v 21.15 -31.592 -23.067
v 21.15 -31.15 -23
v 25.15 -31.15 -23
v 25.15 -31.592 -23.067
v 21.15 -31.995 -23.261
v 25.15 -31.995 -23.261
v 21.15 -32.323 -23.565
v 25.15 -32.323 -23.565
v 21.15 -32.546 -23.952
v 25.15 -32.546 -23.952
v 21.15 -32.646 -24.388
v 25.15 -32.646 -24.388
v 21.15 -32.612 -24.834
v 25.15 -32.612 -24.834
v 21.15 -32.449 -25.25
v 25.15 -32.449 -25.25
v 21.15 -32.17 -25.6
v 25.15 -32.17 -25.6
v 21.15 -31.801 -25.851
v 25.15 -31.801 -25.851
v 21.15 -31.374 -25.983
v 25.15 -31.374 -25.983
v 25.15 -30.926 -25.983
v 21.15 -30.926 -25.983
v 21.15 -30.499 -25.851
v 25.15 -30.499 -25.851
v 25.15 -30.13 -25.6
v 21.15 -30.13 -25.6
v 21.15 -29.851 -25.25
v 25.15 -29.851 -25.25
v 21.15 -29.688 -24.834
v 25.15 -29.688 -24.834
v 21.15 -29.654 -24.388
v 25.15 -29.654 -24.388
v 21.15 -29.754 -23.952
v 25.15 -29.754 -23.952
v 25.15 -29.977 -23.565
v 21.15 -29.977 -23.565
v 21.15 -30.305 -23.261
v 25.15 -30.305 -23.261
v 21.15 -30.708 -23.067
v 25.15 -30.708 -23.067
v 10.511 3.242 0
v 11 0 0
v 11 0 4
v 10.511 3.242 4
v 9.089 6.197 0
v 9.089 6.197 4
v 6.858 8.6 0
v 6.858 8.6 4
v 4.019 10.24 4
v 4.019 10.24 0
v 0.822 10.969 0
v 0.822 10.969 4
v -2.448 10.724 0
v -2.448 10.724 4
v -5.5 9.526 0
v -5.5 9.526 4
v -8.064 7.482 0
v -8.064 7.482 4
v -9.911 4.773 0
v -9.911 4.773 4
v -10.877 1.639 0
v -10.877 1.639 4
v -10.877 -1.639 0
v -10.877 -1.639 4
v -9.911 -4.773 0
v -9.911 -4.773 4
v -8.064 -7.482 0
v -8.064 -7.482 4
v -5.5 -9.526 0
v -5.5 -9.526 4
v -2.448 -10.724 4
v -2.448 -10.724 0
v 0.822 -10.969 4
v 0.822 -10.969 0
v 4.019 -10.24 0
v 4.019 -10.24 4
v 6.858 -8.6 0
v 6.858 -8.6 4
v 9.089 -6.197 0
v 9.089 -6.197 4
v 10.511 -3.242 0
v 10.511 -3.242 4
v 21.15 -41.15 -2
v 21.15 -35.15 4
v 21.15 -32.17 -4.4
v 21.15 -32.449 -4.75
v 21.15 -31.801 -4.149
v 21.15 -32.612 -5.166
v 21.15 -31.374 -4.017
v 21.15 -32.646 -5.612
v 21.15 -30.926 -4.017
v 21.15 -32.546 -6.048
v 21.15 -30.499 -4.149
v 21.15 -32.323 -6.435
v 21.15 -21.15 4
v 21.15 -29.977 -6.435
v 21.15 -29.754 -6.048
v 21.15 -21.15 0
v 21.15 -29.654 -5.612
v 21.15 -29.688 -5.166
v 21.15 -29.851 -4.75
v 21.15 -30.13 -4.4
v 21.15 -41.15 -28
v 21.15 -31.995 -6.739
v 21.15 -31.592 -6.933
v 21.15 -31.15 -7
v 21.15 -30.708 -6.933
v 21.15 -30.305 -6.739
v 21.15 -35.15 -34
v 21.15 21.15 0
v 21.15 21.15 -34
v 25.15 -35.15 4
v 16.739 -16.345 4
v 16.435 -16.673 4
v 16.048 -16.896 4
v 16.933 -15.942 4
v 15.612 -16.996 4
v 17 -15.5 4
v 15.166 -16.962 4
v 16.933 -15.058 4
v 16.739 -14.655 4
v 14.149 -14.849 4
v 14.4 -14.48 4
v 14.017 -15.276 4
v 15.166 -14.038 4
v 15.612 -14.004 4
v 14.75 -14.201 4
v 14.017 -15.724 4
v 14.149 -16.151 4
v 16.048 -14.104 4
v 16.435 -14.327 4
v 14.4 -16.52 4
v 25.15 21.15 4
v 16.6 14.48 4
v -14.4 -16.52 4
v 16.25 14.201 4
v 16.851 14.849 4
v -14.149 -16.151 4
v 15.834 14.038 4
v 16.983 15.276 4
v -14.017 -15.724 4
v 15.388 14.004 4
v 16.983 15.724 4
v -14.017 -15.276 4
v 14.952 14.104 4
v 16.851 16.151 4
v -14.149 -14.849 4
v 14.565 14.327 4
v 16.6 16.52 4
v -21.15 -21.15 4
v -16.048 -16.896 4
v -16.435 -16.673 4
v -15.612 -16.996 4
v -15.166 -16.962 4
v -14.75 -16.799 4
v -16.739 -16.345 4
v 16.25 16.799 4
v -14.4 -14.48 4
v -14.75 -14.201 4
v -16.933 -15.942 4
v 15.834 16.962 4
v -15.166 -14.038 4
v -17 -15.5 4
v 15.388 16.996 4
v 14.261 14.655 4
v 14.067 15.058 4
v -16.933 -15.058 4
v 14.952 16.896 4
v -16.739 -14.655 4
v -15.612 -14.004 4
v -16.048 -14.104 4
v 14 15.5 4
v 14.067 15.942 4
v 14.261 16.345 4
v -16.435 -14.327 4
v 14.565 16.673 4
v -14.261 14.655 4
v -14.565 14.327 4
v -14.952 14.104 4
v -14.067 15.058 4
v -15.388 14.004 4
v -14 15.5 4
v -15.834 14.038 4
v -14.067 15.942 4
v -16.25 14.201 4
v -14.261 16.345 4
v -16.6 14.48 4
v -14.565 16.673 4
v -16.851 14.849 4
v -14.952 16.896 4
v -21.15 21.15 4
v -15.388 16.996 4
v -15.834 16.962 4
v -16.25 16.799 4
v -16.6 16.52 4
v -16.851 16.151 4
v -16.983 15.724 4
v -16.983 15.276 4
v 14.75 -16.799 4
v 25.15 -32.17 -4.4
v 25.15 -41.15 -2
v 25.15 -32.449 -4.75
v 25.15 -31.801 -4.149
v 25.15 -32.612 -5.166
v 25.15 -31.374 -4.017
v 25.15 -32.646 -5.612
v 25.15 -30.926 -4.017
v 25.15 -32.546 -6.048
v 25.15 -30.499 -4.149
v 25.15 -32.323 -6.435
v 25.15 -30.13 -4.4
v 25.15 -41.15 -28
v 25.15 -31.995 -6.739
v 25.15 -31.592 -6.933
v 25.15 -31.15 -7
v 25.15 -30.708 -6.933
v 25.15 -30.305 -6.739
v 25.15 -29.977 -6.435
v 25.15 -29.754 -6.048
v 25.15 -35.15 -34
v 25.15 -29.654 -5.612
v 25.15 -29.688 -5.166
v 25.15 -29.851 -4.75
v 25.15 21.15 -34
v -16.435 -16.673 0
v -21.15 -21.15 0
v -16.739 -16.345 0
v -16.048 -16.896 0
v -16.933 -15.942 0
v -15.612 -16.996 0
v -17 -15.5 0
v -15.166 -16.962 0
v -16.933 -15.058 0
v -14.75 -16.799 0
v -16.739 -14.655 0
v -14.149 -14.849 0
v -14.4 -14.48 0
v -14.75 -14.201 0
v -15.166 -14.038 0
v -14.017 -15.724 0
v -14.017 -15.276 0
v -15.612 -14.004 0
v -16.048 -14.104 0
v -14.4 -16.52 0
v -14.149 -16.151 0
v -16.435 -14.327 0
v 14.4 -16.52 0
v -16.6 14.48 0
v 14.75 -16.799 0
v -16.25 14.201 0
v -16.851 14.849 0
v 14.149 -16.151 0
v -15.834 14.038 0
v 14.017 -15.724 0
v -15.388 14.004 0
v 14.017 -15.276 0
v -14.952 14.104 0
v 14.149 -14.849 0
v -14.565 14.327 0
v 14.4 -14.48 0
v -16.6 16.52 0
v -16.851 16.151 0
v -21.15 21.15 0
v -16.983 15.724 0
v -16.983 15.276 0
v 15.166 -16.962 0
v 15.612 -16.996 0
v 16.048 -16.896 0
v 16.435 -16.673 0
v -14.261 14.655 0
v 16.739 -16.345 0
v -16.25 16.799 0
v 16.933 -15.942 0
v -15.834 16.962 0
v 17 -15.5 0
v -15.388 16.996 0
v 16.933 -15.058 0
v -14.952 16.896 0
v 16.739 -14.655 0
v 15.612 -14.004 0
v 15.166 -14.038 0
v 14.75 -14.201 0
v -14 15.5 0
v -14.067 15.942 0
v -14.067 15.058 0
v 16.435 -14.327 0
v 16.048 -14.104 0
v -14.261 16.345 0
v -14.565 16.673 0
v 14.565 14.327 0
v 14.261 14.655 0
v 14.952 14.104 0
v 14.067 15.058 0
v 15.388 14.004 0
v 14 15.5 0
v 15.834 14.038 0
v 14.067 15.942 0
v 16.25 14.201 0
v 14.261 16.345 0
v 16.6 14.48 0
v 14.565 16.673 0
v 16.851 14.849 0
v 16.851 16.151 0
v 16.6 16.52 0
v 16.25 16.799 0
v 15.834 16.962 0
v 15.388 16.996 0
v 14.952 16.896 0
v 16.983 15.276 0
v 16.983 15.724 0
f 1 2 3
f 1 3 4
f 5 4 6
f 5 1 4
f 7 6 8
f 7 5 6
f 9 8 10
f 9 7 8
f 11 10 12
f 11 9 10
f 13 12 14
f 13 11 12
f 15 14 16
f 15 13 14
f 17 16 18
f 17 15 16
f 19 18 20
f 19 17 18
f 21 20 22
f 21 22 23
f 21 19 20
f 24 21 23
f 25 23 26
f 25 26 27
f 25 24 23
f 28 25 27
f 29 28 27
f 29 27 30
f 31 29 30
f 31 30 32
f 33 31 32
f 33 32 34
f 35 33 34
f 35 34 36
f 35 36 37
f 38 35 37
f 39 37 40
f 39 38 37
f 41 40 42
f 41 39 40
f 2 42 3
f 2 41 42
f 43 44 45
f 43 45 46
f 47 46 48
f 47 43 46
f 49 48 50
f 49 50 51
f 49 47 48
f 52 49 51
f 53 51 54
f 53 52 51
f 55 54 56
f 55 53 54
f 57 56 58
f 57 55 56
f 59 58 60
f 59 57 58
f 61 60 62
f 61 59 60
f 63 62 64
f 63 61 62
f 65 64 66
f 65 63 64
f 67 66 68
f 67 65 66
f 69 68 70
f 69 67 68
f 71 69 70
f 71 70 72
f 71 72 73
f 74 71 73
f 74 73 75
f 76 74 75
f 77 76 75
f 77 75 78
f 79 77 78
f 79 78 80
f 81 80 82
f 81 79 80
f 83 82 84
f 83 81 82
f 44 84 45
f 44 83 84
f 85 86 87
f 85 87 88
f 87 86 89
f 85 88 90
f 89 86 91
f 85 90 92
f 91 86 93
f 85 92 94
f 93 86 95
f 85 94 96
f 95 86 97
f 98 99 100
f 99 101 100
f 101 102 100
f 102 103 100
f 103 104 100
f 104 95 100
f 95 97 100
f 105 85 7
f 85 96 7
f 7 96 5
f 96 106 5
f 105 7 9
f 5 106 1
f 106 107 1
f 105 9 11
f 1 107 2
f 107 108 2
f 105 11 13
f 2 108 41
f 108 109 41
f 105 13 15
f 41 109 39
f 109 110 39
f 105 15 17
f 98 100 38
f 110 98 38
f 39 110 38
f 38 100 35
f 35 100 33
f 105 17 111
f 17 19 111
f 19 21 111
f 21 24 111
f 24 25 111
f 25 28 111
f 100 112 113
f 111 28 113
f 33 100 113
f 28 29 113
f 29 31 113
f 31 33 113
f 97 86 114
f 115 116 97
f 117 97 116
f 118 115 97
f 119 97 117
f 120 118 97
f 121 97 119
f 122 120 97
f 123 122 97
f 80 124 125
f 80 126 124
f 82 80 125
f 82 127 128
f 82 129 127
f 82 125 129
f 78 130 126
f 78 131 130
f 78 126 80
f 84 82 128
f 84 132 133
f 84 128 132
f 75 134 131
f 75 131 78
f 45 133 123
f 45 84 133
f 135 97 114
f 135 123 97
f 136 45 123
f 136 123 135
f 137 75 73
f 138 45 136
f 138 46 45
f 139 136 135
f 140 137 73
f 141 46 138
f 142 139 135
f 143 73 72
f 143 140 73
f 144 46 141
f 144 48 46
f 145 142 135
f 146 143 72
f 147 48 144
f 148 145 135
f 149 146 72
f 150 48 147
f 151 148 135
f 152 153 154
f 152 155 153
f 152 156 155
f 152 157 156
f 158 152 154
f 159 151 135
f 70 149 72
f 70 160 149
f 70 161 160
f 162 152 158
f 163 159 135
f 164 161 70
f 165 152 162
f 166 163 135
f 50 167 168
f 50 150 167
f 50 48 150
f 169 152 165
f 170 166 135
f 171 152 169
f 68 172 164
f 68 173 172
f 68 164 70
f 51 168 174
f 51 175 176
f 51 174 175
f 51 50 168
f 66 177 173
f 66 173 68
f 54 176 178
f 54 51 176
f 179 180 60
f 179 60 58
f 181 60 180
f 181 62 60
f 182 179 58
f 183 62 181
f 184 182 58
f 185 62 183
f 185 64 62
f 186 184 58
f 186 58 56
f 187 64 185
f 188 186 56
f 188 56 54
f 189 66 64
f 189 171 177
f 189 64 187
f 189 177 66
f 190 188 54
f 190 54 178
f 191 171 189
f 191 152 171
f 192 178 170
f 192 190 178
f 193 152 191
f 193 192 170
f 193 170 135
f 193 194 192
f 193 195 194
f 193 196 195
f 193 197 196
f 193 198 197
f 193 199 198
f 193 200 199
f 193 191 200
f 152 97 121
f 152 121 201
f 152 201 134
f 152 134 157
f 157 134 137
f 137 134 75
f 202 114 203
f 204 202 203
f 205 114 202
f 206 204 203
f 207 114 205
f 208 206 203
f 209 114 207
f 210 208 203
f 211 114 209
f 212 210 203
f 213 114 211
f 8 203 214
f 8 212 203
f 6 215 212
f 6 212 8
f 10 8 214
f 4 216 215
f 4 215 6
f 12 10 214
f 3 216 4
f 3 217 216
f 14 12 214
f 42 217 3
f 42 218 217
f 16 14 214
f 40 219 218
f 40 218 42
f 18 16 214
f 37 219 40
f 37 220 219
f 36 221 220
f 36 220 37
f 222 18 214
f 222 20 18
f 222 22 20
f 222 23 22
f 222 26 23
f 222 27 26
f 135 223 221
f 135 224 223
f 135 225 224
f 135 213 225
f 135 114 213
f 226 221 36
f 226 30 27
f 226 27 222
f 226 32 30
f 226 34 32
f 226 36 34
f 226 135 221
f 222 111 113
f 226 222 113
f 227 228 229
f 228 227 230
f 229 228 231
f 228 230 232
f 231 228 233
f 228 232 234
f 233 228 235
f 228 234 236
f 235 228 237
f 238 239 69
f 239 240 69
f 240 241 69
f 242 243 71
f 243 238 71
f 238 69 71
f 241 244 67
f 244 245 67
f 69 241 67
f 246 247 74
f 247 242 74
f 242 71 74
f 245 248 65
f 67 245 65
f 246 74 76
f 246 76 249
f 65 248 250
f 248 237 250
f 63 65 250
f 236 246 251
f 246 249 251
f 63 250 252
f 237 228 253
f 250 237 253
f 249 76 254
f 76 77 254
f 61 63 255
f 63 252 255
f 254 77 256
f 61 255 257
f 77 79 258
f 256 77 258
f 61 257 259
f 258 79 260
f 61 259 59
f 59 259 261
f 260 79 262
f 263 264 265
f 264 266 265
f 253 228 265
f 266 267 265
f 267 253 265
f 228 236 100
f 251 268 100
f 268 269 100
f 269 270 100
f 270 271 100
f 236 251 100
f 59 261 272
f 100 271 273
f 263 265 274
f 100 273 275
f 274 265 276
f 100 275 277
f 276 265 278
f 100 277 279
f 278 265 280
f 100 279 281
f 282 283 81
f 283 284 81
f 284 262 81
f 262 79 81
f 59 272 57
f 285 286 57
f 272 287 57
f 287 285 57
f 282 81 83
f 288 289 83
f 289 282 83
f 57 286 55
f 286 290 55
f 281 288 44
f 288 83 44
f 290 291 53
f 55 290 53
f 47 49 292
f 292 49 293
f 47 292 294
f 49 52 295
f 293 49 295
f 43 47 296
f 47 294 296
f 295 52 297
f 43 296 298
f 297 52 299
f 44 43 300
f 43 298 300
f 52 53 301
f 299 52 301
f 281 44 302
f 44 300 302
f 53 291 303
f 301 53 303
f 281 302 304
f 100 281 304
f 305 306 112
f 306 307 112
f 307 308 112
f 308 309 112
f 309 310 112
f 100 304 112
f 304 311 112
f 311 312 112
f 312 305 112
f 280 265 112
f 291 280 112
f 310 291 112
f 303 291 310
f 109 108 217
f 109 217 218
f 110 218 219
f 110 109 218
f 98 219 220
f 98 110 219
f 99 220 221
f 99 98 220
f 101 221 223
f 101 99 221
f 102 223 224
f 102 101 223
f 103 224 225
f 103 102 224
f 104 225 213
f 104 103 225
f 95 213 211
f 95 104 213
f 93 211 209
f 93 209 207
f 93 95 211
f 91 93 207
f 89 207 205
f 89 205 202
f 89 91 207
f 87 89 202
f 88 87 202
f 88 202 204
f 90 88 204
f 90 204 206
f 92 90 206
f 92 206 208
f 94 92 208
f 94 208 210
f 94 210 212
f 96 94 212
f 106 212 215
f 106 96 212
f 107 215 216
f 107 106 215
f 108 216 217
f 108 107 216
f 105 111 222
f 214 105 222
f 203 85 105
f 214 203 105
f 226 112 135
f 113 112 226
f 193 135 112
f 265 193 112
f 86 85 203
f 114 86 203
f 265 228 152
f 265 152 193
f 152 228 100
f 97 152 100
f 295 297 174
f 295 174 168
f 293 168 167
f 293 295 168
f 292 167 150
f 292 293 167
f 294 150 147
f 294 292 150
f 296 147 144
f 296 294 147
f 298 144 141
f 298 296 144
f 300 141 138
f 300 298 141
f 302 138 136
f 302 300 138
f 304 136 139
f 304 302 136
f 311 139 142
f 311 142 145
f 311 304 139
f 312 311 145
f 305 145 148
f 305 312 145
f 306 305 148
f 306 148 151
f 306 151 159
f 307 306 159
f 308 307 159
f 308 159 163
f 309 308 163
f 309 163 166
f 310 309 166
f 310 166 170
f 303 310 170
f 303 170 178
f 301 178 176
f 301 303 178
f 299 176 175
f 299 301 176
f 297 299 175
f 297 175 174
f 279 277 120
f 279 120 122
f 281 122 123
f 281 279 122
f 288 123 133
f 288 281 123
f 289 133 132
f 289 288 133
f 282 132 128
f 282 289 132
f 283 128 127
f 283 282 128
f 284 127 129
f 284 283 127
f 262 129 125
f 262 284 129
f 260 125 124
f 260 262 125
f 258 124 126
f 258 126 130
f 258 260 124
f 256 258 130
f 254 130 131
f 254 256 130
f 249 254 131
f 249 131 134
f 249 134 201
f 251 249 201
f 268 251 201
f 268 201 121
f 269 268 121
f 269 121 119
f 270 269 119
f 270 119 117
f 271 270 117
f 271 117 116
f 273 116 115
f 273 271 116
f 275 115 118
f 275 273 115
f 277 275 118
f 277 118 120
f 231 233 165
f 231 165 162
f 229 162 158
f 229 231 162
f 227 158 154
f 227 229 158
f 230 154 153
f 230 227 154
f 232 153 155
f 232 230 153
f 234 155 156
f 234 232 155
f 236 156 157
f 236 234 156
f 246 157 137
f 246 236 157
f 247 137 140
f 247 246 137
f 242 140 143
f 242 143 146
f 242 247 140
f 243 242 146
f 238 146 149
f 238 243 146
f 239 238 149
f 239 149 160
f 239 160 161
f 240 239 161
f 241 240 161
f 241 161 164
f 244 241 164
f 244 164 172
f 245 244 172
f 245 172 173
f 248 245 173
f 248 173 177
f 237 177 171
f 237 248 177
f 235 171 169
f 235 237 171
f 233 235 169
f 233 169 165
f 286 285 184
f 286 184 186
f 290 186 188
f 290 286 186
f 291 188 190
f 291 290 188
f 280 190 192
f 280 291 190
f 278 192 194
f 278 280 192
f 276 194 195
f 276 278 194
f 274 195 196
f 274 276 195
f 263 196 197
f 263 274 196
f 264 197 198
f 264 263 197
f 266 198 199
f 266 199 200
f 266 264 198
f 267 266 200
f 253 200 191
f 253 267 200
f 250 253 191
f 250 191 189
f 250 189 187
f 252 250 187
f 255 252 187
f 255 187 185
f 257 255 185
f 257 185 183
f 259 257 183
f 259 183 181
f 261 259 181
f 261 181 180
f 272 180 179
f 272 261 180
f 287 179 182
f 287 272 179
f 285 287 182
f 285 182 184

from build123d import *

# Parameters (mm, degrees)
SKETCH_1_W      = 42.3
SKETCH_1_H      = 42.3
SKETCH_1_R      = 11
SKETCH_1_R_2    = 1.5
EXTRUDE_1_DEPTH = 4
SKETCH_2_W      = 38
SKETCH_2_H      = 62.3
SKETCH_2_R      = 1.5
EXTRUDE_2_DEPTH = 4
CHAMFER_1_SIZE  = 6


with BuildPart() as part:
    # 스케치1 → 보스-돌출1 (new body)
    with BuildSketch(Plane.XY):
        Rectangle(SKETCH_1_W, SKETCH_1_H)
        Circle(SKETCH_1_R, mode=Mode.SUBTRACT)
        with Locations((-15.5, 15.5)):
            Circle(SKETCH_1_R_2, mode=Mode.SUBTRACT)
        with Locations(Location((15.5, 15.5, 0), (0, 0, 180))):
            Circle(SKETCH_1_R_2, mode=Mode.SUBTRACT)
        with Locations((15.5, -15.5)):
            Circle(SKETCH_1_R_2, mode=Mode.SUBTRACT)
        with Locations(Location((-15.5, -15.5, 0), (0, 0, 180))):
            Circle(SKETCH_1_R_2, mode=Mode.SUBTRACT)
    extrude(amount=EXTRUDE_1_DEPTH)

    # 스케치2 → 보스-돌출2 (add)
    with BuildSketch(Plane(origin=(21.15, 0, 0), x_dir=(0, 0, -1), z_dir=(1, 0, 0))):
        with Locations((15, -10)):
            Rectangle(SKETCH_2_W, SKETCH_2_H)
        with Locations((5.5, -31.15)):
            Circle(SKETCH_2_R, mode=Mode.SUBTRACT)
        with Locations(Location((24.5, -31.15, 0), (0, 0, 180))):
            Circle(SKETCH_2_R, mode=Mode.SUBTRACT)
    extrude(amount=EXTRUDE_2_DEPTH)

    # 모따기1
    chamfer_1_edges = [part.edges().sort_by_distance(p)[0] for p in [
        (23.15, -41.15, 4),
        (23.15, -41.15, -34),
    ]]
    chamfer(chamfer_1_edges, length=CHAMFER_1_SIZE)


solid = part.part
